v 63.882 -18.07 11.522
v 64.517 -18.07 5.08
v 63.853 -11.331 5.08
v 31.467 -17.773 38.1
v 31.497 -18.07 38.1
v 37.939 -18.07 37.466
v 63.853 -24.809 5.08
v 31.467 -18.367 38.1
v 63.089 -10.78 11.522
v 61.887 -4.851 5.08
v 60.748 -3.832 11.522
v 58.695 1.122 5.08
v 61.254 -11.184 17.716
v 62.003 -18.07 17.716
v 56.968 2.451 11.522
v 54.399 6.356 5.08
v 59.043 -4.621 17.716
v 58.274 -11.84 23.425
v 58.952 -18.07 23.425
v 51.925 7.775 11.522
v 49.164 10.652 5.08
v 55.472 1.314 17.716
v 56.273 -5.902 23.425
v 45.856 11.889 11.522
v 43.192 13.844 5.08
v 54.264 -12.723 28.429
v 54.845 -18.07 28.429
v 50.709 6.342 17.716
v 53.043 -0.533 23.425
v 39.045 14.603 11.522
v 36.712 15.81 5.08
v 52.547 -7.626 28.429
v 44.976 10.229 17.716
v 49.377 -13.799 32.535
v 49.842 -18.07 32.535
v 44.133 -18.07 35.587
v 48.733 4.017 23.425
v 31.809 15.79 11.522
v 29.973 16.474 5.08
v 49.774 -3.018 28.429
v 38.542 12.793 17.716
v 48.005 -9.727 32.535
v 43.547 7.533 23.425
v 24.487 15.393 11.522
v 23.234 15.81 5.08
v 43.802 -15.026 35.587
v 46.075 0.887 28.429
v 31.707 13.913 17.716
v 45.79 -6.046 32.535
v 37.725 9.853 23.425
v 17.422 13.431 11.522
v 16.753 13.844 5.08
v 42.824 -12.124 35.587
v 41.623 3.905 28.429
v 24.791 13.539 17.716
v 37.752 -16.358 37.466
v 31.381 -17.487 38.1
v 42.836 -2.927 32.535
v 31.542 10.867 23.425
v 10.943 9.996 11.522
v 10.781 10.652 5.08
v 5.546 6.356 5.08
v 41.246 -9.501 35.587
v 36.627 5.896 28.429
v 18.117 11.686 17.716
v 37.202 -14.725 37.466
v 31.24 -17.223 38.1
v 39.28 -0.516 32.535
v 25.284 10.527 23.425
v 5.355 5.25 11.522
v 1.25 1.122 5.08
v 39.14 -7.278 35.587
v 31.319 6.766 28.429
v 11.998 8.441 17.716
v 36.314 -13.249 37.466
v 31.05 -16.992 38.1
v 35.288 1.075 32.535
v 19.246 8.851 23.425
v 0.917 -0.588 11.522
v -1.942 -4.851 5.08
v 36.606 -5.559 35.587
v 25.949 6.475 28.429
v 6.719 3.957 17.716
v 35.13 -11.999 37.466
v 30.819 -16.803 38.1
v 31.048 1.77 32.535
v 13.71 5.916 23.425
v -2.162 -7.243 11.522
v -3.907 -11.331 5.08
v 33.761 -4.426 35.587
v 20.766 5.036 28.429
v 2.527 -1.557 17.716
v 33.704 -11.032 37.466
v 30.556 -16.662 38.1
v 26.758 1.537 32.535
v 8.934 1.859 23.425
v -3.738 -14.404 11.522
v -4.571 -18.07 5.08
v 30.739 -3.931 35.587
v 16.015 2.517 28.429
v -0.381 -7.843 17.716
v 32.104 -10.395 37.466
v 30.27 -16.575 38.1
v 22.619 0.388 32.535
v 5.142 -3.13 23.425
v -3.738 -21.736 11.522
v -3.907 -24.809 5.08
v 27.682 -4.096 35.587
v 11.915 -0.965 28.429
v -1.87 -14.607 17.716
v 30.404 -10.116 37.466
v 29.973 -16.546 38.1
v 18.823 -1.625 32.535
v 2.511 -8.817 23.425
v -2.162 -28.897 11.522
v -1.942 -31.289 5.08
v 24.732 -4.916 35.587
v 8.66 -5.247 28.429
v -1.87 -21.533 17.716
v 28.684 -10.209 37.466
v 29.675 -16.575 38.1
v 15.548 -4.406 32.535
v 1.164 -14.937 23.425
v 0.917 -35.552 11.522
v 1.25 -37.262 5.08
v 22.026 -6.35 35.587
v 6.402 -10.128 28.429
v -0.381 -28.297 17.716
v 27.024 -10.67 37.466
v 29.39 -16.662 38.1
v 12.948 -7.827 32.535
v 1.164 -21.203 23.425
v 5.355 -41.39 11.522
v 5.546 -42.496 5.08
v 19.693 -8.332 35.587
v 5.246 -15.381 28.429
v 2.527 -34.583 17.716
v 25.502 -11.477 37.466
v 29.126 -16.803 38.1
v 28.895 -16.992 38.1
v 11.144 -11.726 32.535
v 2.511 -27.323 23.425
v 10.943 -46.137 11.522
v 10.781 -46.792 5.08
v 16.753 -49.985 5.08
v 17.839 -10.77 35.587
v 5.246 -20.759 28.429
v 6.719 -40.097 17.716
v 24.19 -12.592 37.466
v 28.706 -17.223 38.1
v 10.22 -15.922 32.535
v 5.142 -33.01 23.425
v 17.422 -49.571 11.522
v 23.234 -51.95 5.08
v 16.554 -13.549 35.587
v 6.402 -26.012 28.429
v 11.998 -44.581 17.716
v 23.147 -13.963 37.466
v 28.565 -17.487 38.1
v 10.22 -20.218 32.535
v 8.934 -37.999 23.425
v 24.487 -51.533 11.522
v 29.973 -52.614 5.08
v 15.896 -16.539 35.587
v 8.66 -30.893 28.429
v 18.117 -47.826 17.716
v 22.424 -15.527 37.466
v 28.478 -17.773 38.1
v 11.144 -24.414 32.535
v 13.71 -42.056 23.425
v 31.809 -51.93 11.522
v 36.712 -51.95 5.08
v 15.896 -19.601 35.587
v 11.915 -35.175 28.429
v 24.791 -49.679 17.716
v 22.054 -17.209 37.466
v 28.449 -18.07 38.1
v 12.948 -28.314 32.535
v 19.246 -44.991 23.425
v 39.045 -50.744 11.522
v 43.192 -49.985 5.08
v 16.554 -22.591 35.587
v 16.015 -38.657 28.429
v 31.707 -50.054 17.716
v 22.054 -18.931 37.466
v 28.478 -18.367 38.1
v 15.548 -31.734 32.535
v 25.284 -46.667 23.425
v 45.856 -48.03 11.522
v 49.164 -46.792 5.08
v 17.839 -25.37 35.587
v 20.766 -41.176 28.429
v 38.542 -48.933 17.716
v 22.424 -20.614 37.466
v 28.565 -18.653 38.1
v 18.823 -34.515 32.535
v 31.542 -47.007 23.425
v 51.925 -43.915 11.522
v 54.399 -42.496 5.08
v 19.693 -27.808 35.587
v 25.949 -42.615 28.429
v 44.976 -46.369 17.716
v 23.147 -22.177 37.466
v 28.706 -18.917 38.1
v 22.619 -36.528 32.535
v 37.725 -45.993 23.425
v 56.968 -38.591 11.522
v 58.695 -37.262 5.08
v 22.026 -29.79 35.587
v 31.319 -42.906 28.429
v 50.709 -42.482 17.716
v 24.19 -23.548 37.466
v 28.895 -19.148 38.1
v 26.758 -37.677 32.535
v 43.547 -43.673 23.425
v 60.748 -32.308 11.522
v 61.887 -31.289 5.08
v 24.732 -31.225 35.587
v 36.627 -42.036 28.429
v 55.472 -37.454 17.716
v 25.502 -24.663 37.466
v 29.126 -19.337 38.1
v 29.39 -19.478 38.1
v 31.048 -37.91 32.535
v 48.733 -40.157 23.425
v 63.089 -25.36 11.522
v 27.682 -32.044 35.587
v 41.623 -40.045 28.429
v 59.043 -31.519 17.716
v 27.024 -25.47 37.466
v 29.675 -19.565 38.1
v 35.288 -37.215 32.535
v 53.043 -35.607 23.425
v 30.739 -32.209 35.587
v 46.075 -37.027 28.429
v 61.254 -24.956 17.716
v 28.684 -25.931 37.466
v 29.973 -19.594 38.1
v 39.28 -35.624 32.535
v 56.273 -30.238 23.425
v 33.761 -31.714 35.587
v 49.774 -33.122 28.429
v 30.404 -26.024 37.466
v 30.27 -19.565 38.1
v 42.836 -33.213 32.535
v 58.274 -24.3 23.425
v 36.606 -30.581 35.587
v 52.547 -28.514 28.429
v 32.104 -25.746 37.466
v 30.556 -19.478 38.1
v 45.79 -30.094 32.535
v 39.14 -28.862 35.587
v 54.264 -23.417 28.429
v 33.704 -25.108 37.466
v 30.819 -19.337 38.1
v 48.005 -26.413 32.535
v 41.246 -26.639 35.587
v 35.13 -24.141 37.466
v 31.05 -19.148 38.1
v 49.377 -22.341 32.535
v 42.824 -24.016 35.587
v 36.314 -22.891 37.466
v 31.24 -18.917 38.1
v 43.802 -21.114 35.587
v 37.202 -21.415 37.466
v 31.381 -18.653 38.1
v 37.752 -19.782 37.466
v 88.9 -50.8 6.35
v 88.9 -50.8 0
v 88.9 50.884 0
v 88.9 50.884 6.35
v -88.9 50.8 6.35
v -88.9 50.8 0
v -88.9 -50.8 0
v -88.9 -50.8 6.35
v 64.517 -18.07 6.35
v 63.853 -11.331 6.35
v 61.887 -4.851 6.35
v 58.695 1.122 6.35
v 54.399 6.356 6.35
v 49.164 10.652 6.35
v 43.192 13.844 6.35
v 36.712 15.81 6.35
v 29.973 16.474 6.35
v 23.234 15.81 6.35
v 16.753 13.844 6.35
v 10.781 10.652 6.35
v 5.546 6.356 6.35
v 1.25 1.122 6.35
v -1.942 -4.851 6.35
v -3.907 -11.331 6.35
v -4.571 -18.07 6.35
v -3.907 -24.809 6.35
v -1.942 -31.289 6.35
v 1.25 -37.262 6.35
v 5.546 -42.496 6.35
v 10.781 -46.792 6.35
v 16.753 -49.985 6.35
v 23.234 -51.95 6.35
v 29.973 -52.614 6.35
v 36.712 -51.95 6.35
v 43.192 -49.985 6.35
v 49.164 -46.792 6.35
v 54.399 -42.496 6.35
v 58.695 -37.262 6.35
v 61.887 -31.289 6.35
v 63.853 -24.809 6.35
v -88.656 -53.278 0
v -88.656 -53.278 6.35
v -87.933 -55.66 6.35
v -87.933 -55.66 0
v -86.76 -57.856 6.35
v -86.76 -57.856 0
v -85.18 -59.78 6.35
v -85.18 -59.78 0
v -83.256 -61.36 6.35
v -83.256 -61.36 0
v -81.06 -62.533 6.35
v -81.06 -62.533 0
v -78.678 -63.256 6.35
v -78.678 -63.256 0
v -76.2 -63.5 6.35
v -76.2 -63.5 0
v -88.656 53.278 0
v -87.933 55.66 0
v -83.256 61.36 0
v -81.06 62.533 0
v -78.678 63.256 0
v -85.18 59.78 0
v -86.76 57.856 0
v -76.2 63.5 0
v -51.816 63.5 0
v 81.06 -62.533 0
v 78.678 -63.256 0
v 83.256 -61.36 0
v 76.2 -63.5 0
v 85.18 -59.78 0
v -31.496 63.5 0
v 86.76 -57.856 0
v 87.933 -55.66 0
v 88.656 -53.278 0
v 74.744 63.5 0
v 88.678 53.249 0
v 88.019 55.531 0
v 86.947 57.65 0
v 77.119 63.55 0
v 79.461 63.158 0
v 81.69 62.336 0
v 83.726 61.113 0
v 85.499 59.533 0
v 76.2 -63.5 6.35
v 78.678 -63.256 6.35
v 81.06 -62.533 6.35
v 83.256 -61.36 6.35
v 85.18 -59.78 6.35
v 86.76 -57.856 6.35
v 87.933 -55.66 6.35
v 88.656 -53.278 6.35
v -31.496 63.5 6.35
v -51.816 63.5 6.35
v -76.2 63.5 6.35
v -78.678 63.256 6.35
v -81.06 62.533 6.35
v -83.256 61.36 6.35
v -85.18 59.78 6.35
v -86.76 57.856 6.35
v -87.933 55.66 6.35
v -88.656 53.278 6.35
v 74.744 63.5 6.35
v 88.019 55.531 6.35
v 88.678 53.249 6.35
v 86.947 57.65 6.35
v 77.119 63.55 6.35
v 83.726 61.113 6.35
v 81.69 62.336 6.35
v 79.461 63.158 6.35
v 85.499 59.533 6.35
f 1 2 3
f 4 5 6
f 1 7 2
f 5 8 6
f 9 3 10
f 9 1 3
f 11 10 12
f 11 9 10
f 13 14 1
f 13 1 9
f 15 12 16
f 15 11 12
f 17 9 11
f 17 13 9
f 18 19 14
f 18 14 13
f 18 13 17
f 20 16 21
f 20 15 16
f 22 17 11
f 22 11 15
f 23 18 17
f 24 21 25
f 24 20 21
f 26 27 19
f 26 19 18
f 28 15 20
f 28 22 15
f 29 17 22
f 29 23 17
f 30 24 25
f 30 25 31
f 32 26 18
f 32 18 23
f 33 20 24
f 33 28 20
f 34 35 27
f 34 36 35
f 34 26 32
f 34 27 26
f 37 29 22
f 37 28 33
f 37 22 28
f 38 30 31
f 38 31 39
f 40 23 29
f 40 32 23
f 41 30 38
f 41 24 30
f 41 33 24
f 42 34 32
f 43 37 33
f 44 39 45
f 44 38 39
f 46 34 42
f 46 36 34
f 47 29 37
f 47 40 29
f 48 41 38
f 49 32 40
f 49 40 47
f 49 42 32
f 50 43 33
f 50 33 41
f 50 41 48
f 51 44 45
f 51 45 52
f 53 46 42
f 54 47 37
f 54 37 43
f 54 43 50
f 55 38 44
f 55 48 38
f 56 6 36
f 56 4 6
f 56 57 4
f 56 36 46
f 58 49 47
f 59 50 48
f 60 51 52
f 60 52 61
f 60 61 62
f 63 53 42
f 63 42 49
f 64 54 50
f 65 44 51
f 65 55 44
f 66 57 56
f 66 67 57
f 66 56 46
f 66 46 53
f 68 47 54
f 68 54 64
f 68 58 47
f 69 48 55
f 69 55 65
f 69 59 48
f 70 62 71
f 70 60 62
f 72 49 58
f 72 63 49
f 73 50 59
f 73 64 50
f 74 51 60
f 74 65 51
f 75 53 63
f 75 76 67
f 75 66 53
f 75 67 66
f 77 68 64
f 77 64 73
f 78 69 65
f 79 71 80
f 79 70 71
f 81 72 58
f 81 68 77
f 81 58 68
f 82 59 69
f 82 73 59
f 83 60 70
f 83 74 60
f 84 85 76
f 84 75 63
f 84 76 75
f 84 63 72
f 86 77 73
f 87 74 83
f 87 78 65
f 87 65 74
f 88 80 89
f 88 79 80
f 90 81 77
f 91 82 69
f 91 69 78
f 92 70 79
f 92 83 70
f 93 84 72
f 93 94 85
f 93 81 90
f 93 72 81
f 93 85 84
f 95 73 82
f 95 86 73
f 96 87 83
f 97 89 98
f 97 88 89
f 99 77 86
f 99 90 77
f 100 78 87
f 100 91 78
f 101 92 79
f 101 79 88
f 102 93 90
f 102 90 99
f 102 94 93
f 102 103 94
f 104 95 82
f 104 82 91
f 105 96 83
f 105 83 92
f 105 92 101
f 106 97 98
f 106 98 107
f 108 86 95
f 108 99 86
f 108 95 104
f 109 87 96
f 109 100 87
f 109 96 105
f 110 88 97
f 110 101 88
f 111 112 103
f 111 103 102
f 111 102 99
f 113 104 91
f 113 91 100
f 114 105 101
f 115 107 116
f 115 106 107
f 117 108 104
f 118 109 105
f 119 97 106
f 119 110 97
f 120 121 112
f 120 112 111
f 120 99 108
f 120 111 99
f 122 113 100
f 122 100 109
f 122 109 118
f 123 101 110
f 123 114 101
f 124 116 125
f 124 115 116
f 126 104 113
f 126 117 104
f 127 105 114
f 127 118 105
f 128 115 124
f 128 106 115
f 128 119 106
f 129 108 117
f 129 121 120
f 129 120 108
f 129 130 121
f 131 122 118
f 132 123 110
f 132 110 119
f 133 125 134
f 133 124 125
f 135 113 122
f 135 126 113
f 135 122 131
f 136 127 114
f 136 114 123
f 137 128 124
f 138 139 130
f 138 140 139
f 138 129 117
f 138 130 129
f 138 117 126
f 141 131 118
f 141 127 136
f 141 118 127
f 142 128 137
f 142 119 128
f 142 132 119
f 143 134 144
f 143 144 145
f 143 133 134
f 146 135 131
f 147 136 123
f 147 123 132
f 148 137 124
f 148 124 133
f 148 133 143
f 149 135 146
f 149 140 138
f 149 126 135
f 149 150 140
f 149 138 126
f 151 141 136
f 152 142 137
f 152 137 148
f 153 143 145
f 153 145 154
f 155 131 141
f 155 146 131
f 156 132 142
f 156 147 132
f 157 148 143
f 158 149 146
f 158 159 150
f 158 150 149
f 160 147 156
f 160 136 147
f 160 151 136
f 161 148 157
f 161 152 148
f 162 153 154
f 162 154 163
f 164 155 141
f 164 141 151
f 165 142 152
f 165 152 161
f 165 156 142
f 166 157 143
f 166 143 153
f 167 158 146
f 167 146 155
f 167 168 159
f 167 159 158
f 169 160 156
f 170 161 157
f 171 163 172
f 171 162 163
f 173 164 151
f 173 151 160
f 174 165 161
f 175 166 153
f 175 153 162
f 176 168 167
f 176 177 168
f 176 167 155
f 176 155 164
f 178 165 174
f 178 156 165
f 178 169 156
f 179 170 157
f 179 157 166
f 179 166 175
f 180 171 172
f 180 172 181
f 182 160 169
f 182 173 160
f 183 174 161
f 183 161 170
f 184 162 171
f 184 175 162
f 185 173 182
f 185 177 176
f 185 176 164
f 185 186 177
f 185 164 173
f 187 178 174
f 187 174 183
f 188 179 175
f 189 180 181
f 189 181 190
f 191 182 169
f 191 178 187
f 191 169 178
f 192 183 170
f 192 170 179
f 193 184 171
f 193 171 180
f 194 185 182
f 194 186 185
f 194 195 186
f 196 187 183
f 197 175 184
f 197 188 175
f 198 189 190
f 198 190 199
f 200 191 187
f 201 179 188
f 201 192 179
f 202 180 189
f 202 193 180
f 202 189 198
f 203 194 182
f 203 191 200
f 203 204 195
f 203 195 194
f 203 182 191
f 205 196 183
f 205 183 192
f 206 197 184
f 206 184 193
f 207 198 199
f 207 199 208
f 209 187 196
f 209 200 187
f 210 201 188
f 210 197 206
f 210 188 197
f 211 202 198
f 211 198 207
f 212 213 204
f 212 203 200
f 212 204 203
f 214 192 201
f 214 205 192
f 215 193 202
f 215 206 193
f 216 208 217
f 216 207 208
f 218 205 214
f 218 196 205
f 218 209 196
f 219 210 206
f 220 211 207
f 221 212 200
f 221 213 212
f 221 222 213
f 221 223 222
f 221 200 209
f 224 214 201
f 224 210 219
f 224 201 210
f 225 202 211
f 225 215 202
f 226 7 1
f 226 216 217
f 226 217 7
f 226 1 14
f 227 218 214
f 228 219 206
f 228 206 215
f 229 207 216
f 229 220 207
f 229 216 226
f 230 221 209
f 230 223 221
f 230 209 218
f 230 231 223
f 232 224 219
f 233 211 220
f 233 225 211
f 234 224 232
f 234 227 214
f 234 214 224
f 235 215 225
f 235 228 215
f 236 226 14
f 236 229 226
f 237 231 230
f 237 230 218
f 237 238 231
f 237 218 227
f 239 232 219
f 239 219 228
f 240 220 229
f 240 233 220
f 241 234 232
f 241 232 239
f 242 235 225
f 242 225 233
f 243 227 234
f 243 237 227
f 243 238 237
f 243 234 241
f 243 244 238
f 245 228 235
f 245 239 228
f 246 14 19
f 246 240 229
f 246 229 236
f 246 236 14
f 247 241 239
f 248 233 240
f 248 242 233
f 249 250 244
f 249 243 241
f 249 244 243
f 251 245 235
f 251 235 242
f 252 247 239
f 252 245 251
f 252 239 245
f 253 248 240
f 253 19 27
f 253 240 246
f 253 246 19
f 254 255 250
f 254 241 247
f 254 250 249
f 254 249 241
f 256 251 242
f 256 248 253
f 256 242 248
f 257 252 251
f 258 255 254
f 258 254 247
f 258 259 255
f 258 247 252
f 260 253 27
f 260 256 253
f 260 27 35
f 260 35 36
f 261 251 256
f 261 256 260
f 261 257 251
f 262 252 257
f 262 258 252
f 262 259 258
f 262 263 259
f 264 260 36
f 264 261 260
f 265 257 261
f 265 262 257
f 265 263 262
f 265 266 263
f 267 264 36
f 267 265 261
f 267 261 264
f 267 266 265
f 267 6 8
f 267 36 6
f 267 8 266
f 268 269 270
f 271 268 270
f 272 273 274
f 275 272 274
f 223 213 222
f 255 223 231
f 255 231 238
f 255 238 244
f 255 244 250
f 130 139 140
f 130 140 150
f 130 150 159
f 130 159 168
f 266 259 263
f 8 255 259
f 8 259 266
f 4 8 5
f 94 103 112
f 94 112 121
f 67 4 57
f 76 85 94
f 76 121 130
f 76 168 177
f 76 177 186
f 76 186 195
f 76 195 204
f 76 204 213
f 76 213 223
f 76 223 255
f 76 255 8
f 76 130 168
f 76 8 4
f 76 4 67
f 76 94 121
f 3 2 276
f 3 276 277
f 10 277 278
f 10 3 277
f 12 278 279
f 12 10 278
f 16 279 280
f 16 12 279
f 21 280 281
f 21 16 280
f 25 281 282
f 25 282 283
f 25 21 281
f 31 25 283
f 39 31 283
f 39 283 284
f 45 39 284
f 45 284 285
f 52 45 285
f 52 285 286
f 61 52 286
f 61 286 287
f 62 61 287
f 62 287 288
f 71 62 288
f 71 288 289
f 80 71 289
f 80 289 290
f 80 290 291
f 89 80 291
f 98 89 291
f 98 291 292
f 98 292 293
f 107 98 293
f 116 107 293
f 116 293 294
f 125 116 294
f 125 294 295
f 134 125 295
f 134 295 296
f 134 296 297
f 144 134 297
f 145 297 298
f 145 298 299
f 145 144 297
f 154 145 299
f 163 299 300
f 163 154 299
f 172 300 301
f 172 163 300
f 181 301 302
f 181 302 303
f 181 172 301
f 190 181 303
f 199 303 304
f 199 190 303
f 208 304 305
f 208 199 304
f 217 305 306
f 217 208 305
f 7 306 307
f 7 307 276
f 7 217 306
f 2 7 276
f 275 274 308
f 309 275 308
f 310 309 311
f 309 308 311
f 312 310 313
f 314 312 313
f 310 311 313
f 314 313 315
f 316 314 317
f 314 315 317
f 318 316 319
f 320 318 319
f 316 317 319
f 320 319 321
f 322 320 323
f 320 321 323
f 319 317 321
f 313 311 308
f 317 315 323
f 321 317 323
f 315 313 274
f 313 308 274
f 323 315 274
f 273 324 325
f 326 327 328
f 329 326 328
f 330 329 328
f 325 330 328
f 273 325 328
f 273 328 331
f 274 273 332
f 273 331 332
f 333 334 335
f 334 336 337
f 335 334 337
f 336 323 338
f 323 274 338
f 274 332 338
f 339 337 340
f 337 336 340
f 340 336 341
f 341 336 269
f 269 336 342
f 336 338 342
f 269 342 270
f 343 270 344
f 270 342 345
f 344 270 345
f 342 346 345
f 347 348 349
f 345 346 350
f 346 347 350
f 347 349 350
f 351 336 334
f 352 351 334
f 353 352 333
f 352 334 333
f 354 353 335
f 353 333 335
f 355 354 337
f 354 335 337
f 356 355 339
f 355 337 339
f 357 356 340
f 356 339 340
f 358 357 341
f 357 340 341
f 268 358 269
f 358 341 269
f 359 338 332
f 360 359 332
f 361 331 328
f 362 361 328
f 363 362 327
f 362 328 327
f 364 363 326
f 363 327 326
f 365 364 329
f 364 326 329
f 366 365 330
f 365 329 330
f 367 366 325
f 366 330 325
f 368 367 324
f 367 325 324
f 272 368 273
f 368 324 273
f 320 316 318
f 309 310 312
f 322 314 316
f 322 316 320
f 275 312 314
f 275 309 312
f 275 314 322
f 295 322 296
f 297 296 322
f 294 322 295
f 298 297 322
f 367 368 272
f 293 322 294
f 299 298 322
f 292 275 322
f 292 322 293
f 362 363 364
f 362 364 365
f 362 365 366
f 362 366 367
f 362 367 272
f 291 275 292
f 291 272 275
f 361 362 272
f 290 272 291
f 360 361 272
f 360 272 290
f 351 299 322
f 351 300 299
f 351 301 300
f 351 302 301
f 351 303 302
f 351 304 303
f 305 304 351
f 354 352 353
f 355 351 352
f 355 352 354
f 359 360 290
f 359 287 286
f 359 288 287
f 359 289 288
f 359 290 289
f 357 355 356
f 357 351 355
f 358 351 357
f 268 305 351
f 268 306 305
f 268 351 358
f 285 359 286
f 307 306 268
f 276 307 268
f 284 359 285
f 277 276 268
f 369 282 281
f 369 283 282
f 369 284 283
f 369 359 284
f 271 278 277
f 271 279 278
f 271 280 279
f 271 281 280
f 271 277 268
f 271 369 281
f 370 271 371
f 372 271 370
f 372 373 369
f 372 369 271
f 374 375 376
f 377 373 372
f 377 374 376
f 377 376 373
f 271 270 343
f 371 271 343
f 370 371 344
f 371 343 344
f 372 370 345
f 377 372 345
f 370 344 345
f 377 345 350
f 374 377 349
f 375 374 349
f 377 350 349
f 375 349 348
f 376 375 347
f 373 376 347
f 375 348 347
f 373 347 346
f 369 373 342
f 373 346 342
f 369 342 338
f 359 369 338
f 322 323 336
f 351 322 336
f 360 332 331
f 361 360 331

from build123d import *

# Parameters (mm, degrees)
F0_R     = 34.544
F1_DEPTH = 38.1
F2_R     = 33.02
F4_DEPTH = 6.35


# Not quite as in the source:
# - the program builds the solid bodies; features that only make, move or delete a surface that nothing else refers to are left out


with BuildPart() as f1:
    # F0 (on Top) → F1 (new body)
    with BuildSketch(Plane.XY):
        with Locations((29.9727506936, -18.0700458586)):
            Circle(F0_R)
    extrude(amount=F1_DEPTH)

    # F2
    f2_edges = [f1.edges().sort_by_distance(p)[0] for p in [
        (-4.571249, -18.070046, 38.1),
    ]]
    fillet(f2_edges, radius=F2_R)

    # F0 (on Top) → F4 (join)
    with BuildSketch(Plane.XY):
        with BuildLine():
            Line((-76.2, -63.5), (76.2, -63.5))
            ThreePointArc((76.2, -63.5), (85.1802561211, -59.7802561211), (88.9, -50.8))
            Line((88.9, -50.8), (88.9, 50.8837117301))
            ThreePointArc((88.9, 50.8837117301), (84.6499025139, 60.364700471), (74.7442287394, 63.500000013))
            Line((74.7442287394, 63.500000013), (-31.496, 63.500000013))
            Line((-31.496, 63.500000013), (-51.816, 63.5))
            Line((-51.816, 63.5), (-76.2, 63.5))
            ThreePointArc((-76.2, 63.5), (-85.1802561211, 59.7802561211), (-88.9, 50.8))
            Line((-88.9, 50.8), (-88.9, -50.8))
            ThreePointArc((-88.9, -50.8), (-85.1802561211, -59.7802561211), (-76.2, -63.5))
        make_face()
        with Locations((29.9727506936, -18.0700458586)):
            Circle(F0_R, mode=Mode.SUBTRACT)
    extrude(amount=F4_DEPTH)


solid = f1.part
